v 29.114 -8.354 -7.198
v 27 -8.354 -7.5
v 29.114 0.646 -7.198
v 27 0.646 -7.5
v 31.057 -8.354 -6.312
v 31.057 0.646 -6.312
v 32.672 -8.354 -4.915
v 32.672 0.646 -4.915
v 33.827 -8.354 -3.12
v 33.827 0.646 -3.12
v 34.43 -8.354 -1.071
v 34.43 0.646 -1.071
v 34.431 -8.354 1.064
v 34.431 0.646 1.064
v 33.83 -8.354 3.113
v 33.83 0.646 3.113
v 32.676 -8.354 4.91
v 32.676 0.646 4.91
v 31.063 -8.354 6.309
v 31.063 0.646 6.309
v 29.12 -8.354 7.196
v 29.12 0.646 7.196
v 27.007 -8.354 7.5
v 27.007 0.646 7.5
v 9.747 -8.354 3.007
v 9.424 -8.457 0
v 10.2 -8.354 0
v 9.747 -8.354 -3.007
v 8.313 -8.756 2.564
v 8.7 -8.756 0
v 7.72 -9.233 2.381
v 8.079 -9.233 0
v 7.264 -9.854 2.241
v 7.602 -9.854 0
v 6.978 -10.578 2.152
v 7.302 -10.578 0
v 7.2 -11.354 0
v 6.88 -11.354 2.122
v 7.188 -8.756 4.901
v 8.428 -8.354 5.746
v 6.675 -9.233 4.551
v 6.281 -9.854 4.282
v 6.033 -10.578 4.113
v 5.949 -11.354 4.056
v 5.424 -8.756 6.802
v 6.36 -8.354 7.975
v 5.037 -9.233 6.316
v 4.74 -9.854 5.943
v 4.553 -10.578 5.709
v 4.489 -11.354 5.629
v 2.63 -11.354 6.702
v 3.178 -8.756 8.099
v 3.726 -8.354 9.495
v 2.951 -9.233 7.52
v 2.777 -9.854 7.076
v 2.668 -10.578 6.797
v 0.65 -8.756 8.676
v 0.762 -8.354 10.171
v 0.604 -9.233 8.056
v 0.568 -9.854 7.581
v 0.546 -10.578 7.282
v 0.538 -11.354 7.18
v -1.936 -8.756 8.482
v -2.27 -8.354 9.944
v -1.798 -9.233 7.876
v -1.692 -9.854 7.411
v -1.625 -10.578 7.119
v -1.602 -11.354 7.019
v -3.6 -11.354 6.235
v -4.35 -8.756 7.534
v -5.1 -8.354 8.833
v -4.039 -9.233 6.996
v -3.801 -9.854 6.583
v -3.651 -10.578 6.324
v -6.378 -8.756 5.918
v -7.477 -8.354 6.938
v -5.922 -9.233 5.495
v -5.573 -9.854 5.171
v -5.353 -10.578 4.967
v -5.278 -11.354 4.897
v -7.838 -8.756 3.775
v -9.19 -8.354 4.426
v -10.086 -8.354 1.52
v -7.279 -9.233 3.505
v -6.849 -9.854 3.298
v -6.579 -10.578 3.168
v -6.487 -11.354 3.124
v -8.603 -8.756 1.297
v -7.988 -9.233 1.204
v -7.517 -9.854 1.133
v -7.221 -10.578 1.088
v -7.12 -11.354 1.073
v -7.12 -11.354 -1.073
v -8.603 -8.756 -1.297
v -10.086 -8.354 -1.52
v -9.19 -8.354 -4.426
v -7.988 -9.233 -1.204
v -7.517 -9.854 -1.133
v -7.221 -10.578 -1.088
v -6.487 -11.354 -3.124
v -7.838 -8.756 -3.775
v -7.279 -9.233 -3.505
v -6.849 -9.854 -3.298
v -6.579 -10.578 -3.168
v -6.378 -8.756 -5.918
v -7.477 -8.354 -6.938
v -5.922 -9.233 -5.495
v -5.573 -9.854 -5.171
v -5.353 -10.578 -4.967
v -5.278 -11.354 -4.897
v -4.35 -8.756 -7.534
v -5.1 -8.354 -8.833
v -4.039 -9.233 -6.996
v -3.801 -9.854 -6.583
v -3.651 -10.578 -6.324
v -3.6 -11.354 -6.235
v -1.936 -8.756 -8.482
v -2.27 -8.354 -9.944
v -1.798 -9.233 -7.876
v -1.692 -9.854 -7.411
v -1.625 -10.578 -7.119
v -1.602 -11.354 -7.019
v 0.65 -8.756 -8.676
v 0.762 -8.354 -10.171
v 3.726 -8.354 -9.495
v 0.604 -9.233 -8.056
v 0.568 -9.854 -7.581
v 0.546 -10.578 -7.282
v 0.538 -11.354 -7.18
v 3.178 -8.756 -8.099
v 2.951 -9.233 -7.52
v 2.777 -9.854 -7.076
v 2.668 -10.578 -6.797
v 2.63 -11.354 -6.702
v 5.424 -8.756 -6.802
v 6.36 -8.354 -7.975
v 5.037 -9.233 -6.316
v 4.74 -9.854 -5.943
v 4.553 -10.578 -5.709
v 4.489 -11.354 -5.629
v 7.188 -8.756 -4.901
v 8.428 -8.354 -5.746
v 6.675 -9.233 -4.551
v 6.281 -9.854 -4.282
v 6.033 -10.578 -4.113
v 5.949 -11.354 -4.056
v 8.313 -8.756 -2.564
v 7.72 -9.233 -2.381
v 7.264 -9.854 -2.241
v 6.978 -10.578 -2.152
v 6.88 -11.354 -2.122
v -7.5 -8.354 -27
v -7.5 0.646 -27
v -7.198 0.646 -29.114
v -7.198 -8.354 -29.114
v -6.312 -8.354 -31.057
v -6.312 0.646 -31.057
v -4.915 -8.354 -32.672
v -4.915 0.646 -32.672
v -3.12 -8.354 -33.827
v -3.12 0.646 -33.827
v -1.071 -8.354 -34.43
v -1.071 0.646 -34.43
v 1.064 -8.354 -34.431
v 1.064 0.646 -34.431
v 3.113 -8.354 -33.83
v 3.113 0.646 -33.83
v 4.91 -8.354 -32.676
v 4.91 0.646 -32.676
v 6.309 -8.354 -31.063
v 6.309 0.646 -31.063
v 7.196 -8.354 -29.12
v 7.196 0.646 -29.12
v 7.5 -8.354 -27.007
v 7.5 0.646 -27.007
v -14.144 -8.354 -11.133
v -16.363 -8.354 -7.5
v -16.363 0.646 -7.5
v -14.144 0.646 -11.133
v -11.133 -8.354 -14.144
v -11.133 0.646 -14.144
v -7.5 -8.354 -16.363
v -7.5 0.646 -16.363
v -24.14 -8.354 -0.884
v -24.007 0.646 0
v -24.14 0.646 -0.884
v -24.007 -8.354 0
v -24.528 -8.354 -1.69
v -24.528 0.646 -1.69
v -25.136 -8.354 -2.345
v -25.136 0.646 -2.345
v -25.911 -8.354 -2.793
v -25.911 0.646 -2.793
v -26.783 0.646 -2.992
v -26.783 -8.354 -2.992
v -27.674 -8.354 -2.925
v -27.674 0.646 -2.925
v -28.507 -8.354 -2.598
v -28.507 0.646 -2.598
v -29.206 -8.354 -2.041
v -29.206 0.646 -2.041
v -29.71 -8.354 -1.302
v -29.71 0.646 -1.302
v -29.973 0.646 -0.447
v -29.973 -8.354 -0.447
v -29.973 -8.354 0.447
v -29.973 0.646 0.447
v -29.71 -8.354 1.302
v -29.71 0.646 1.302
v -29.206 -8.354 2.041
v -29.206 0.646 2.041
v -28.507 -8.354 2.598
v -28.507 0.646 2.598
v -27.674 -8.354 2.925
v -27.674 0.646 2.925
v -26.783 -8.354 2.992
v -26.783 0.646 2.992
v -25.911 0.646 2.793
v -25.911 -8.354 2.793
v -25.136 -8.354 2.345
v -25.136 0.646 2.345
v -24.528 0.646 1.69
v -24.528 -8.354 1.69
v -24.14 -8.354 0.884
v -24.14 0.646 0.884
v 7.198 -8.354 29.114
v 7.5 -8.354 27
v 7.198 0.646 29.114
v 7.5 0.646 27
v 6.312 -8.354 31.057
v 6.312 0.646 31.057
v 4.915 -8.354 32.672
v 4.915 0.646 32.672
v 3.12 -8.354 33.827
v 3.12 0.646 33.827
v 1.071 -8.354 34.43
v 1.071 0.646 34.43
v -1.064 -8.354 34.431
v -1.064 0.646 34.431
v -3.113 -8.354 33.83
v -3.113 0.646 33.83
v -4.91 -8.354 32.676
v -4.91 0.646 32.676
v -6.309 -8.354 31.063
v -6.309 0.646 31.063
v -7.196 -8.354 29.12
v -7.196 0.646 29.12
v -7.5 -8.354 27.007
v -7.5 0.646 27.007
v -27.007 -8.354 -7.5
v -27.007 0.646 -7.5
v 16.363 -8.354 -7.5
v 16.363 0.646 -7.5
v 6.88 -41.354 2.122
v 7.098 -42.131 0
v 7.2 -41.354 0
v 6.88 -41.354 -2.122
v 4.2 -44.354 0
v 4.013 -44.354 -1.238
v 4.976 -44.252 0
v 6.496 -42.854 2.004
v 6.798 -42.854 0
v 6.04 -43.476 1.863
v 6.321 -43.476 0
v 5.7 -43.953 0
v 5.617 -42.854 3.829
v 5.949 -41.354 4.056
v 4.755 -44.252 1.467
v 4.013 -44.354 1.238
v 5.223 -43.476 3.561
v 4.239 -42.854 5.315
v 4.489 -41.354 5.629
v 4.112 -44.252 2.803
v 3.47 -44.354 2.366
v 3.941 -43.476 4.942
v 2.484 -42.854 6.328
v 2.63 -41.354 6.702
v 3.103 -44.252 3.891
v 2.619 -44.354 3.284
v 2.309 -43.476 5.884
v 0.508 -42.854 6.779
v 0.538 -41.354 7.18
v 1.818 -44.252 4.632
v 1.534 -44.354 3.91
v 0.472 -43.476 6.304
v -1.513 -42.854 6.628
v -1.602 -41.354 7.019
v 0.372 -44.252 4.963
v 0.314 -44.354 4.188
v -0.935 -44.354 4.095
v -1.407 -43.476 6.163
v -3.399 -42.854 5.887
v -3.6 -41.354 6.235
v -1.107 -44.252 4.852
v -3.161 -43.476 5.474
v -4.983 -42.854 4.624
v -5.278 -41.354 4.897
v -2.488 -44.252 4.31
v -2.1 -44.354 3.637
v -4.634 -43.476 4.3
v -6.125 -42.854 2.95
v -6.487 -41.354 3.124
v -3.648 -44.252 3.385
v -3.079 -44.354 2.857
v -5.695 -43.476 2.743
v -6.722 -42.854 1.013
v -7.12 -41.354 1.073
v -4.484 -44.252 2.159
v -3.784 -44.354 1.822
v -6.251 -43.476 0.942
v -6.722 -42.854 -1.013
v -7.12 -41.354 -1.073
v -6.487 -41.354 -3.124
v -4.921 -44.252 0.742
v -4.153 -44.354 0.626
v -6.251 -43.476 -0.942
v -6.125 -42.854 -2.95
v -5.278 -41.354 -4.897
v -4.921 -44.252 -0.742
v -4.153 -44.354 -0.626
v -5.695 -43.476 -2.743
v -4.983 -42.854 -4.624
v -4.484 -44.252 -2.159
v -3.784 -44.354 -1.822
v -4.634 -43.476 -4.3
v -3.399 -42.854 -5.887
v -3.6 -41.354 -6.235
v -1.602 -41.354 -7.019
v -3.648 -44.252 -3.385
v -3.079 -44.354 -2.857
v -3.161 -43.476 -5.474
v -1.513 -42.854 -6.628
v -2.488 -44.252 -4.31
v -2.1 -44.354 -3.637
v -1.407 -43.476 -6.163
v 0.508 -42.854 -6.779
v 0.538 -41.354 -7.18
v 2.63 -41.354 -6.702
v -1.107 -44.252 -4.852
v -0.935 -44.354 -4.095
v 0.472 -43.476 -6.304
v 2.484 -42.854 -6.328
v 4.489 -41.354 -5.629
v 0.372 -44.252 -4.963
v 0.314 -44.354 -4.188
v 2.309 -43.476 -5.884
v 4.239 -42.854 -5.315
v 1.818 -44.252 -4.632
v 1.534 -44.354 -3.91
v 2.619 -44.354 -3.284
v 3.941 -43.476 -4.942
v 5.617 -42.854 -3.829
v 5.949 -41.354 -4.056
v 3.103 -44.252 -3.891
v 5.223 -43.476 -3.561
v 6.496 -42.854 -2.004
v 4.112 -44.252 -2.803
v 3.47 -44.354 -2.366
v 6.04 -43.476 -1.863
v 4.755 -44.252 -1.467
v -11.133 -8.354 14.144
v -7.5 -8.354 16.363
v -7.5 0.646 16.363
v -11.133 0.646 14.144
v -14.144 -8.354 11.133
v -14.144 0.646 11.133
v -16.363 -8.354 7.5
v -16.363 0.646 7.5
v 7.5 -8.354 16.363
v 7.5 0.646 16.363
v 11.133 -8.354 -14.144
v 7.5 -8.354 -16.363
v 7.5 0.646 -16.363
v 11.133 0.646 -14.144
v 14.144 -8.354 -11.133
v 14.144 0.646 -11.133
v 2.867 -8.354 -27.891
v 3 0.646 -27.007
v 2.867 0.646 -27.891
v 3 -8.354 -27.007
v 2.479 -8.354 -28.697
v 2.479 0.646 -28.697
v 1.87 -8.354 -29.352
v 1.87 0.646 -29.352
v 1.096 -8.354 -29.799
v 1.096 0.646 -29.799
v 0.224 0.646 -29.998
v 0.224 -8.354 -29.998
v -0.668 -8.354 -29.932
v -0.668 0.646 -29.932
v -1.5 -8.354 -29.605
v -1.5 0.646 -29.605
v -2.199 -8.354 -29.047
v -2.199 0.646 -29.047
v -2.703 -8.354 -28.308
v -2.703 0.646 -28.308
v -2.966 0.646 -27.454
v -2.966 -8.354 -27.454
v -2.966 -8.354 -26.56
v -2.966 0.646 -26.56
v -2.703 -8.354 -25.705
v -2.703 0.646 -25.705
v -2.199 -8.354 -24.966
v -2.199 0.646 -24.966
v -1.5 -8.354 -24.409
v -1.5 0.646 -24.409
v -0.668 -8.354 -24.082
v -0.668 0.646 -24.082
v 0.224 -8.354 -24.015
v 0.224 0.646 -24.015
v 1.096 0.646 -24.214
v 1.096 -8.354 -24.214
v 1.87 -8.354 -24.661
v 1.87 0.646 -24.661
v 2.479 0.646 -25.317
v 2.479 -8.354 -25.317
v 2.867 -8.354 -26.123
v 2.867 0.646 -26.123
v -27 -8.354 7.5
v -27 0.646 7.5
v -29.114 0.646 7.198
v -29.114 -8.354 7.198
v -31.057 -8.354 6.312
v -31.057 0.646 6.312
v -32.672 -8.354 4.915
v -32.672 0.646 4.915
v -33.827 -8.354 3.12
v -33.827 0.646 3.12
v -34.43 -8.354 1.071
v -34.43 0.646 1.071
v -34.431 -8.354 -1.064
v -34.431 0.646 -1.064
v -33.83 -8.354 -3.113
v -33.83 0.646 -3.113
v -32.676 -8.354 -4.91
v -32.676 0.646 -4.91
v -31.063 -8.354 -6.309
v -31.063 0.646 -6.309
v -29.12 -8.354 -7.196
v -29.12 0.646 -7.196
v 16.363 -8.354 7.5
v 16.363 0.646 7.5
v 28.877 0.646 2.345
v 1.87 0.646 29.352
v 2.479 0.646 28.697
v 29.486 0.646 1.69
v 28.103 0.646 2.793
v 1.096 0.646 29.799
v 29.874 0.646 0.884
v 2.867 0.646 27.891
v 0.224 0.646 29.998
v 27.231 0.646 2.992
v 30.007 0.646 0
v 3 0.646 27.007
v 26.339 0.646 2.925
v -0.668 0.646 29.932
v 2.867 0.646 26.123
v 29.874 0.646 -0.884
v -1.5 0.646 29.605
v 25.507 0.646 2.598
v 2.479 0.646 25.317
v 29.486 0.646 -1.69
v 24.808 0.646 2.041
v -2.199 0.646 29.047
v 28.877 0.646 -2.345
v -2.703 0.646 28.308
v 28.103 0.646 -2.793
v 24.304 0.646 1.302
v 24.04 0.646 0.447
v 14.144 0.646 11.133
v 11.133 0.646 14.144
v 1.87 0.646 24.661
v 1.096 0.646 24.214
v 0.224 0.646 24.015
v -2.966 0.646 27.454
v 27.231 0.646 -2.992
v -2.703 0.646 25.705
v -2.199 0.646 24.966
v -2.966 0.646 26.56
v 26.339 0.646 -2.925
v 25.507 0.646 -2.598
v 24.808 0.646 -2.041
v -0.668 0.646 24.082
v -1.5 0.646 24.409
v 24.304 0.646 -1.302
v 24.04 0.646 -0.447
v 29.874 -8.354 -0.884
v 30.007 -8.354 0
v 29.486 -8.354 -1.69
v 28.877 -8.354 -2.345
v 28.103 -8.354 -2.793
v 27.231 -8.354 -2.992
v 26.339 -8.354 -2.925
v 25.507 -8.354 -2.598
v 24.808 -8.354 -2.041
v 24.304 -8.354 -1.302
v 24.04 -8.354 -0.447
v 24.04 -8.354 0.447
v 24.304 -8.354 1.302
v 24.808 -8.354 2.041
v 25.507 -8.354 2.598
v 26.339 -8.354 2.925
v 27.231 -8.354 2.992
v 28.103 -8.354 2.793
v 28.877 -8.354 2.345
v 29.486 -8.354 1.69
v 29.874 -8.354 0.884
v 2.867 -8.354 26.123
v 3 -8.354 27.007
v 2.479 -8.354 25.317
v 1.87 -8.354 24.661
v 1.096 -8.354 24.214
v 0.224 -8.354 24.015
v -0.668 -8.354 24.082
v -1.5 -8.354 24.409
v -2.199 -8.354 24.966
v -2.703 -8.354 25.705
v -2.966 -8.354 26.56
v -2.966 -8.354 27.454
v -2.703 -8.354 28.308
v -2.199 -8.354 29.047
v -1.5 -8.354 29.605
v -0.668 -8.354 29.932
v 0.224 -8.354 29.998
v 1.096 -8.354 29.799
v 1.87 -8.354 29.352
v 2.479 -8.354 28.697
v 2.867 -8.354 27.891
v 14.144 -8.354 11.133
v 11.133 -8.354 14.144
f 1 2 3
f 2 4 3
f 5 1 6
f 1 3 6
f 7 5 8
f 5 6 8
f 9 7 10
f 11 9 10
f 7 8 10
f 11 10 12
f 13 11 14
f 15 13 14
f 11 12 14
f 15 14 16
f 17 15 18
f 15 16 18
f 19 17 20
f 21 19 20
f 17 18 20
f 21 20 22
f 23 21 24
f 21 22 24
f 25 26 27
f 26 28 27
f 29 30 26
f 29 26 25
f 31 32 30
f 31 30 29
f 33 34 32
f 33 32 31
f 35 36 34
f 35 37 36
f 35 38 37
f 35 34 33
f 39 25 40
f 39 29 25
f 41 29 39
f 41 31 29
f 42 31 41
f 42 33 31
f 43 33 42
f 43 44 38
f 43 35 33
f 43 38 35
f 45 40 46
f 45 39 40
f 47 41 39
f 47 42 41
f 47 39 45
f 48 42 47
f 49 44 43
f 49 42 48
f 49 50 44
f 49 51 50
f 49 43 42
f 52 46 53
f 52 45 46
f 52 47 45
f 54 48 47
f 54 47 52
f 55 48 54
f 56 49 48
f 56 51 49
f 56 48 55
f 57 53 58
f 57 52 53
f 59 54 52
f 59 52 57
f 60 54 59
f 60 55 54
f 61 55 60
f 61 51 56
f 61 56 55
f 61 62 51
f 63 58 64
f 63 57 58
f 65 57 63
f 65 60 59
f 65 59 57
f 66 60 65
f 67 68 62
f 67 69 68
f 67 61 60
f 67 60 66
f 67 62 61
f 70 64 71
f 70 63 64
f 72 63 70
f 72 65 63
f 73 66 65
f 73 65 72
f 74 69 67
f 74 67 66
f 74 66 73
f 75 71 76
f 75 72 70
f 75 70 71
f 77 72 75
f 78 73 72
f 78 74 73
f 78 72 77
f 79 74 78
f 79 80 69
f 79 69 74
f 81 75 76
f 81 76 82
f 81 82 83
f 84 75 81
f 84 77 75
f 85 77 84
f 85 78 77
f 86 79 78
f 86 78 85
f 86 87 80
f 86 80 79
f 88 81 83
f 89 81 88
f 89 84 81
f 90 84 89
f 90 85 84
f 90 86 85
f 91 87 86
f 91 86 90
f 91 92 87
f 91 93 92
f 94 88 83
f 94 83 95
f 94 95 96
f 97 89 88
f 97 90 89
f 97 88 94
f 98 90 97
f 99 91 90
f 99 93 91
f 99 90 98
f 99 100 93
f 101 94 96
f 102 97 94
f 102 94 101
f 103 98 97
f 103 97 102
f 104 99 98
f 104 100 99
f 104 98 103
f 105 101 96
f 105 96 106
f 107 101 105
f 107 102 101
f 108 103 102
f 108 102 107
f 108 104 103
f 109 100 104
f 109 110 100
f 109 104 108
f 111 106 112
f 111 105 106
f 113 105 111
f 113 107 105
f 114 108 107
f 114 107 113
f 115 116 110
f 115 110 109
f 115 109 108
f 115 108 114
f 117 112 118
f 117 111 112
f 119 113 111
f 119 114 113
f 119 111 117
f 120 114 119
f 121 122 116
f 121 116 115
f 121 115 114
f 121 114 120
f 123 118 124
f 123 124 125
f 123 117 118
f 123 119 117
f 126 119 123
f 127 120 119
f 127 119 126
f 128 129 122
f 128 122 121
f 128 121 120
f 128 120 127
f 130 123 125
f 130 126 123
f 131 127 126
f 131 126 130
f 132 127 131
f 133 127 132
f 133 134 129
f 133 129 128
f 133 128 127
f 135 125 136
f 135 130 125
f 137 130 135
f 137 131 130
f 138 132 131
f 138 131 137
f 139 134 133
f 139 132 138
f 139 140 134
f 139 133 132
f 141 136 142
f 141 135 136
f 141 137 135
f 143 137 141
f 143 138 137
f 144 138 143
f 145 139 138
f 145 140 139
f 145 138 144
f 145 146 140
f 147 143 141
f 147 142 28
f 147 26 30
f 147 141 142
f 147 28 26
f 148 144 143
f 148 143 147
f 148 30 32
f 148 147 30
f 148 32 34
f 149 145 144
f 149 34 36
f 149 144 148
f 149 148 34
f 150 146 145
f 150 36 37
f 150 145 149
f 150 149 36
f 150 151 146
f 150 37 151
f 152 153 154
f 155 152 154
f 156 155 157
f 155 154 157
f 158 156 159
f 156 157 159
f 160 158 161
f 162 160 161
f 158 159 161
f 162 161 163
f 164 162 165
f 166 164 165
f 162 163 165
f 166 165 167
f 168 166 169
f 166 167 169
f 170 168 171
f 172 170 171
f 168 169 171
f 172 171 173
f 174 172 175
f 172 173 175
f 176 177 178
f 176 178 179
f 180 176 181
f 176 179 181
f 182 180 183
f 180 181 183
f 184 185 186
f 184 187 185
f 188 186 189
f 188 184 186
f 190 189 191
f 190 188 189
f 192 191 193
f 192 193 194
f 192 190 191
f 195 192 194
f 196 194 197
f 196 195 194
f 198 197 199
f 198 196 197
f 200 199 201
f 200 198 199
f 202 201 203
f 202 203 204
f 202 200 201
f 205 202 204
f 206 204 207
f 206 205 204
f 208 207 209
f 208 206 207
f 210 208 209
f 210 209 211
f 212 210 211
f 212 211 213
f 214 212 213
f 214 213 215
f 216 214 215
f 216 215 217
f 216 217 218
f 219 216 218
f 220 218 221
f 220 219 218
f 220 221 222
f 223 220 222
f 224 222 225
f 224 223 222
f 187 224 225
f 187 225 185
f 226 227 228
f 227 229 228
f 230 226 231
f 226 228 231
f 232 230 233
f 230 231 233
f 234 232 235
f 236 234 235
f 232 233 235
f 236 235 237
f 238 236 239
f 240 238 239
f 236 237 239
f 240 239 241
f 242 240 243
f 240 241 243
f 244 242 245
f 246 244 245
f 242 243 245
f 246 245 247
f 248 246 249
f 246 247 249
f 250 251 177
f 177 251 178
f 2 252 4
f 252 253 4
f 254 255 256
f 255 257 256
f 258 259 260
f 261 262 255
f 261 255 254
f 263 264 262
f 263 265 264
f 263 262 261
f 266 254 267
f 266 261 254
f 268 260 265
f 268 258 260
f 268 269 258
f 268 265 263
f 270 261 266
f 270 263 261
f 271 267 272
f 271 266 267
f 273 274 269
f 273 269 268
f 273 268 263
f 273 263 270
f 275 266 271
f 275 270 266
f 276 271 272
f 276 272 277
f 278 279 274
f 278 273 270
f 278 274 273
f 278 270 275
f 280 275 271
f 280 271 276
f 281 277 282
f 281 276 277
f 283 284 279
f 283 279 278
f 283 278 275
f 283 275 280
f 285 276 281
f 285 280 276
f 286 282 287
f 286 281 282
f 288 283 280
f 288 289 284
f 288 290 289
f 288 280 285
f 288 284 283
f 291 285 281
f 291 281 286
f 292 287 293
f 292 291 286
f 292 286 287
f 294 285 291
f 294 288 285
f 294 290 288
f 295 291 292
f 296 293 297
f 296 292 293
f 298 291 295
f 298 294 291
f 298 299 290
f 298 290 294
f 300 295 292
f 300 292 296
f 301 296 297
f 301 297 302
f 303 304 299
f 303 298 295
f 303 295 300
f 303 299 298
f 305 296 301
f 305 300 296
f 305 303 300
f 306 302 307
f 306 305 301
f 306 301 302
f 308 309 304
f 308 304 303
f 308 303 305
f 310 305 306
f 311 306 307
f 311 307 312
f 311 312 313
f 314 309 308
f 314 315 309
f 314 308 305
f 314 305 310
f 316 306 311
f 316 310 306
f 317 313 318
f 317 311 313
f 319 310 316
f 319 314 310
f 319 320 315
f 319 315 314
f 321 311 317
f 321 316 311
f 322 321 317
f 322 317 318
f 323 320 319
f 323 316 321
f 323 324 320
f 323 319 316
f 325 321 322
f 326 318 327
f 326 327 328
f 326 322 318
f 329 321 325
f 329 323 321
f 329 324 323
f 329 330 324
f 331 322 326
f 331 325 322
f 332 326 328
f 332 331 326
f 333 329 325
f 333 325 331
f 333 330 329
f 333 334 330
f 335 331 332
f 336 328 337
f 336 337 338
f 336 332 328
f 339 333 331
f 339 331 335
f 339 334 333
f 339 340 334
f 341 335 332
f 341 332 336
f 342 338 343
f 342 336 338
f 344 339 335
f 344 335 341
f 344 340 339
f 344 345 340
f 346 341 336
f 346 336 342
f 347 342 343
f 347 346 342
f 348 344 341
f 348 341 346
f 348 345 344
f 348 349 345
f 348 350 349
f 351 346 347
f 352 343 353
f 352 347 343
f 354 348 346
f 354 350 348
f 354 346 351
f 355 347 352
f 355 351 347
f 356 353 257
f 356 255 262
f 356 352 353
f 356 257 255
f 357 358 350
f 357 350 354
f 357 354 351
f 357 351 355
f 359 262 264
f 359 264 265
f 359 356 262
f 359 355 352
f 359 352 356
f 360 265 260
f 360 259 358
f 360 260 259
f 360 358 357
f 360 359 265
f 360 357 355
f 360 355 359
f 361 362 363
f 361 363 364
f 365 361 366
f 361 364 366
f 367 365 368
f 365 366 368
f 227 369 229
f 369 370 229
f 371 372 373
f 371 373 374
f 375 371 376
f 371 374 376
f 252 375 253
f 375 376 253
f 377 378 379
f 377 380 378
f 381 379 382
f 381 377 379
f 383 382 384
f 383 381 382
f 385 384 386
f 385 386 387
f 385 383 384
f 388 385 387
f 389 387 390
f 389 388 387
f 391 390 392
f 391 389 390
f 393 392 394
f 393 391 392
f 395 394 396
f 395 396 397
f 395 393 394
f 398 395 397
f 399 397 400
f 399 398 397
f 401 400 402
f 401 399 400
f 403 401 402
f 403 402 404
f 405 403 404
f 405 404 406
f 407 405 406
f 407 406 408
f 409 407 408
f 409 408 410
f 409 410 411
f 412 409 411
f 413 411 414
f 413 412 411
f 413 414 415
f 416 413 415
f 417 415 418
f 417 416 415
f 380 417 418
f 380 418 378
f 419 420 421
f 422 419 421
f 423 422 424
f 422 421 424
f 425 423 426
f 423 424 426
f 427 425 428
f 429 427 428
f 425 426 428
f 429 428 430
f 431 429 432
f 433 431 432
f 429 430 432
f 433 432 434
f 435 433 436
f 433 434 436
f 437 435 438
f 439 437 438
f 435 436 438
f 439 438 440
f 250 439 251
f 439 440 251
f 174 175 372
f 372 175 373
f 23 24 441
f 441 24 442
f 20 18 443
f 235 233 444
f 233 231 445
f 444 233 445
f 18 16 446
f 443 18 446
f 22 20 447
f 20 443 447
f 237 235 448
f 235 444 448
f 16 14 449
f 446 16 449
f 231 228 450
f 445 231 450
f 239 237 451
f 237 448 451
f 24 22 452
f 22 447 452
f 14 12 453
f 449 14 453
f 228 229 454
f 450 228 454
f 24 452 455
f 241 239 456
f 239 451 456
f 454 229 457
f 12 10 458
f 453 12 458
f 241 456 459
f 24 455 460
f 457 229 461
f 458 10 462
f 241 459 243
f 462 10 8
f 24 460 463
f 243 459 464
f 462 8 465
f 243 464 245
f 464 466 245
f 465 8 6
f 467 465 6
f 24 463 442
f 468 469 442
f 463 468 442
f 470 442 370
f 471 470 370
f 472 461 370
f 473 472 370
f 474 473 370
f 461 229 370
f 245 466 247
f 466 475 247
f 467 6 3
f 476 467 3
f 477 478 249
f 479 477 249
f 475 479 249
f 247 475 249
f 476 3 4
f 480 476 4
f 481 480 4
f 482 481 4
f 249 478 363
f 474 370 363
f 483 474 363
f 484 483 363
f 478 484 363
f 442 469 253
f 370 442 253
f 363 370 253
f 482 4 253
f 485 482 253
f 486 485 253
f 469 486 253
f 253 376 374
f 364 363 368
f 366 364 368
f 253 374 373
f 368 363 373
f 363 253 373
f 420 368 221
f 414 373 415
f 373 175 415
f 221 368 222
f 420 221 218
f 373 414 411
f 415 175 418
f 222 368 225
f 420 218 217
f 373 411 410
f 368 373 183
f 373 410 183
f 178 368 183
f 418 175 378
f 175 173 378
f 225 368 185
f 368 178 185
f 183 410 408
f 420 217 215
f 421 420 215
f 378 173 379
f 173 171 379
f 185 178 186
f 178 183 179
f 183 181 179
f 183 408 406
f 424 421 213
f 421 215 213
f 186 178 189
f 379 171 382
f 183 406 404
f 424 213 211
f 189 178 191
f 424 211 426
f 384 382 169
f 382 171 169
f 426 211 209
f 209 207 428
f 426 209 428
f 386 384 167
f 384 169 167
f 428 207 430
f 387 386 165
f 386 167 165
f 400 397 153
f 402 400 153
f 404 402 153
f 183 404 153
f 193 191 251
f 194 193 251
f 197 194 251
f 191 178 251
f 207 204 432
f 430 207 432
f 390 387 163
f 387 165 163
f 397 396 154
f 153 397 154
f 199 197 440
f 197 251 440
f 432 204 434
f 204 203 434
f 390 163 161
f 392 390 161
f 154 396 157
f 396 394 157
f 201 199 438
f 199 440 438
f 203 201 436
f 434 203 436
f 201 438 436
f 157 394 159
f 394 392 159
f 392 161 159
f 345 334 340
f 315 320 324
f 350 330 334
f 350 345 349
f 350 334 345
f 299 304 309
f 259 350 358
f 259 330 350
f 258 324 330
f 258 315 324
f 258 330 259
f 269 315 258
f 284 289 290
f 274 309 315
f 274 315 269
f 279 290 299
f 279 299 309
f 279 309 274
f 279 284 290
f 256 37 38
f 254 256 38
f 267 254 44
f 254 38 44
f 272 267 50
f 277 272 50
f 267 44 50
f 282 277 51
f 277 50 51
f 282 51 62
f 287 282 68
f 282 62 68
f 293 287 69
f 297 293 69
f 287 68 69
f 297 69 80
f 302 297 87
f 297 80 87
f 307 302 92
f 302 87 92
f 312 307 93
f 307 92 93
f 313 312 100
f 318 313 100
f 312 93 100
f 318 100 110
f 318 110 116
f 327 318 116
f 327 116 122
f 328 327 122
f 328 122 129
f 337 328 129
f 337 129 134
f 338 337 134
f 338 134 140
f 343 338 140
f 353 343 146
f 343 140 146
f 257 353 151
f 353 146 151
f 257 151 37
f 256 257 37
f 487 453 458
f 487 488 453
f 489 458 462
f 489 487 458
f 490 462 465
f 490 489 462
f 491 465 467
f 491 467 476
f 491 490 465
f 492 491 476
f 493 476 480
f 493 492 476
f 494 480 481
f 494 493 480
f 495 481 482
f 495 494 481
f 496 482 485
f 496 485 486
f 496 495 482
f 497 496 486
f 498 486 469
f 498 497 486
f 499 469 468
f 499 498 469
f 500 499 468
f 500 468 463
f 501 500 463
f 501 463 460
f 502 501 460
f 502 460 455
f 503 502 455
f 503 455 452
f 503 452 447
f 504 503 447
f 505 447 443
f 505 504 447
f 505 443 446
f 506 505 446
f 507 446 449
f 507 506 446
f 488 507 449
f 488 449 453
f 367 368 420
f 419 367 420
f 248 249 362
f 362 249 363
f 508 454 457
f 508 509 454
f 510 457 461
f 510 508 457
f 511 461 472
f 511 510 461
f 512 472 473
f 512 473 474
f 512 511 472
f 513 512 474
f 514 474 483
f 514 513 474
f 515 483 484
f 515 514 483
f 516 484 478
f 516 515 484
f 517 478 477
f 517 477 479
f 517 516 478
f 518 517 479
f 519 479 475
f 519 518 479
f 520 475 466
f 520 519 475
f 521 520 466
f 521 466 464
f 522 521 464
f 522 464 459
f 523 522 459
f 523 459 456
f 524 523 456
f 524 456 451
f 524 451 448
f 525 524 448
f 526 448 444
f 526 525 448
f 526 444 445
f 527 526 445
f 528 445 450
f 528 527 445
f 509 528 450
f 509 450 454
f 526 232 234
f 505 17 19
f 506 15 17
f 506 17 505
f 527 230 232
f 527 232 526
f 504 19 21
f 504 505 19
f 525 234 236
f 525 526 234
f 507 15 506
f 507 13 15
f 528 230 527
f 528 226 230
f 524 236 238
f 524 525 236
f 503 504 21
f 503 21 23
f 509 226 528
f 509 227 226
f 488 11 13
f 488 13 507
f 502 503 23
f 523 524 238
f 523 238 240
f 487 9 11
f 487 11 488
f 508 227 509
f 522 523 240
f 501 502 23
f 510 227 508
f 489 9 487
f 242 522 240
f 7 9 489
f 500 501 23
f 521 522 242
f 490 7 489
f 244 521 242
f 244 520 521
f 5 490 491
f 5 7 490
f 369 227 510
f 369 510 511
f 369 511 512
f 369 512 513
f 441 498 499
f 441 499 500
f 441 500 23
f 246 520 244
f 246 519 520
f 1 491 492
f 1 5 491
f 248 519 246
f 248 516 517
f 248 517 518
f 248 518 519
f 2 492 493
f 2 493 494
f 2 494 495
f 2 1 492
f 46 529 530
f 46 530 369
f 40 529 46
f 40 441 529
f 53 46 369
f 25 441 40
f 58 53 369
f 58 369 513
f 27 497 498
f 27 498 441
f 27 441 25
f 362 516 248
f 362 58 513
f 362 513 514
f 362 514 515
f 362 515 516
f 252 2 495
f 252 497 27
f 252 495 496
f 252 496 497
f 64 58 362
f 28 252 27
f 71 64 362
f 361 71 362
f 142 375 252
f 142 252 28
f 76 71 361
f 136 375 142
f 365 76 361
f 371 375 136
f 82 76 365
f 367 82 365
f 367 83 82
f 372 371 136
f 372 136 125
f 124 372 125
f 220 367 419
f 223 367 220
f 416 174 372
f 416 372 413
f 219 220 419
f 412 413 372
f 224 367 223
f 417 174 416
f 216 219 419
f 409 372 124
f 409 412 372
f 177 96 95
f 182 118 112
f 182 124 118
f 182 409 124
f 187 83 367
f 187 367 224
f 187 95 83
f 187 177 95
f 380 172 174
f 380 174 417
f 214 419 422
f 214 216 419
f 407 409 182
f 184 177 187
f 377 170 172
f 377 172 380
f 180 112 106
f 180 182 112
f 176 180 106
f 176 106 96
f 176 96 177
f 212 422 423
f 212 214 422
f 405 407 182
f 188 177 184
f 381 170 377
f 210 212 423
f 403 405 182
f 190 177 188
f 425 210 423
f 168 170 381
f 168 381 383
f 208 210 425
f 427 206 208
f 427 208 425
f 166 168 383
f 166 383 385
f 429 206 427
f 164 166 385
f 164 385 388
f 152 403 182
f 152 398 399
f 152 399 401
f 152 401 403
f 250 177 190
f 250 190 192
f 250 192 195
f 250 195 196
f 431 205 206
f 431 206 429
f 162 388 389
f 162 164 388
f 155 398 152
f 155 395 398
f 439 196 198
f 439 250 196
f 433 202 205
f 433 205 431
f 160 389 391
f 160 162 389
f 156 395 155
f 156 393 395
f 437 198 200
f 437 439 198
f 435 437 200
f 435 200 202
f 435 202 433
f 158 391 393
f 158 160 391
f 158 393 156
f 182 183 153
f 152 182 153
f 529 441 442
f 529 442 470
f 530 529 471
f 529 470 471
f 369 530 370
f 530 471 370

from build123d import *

# Parameters (mm, degrees)
SKETCH1_R           = 5
BOSS_EXTRUDE1_DEPTH = 7.5
SKETCH2_R           = 12
BOSS_EXTRUDE2_DEPTH = 60
FILLET1_R           = 5
SCALE1_SCALE        = 0.6


with BuildPart() as part:
    # Sketch1 → Boss-Extrude1 (new body, symmetric)
    with BuildSketch(Plane(origin=(0, 0, 0), x_dir=(1, 0, 0), z_dir=(0, 1, 0))):
        with BuildLine():
            Line((12.5, 45.011324124), (12.5, 27.271780287))
            ThreePointArc((12.5, 27.271780287), (21.213203436, 21.213203436), (27.271780287, 12.5))
            Line((27.271780287, 12.5), (45, 12.5))
            ThreePointArc((45, 12.5), (57.511322842, 0.00566206), (45.011324124, -12.5))
            Line((45.011324124, -12.5), (27.271780287, -12.5))
            ThreePointArc((27.271780287, -12.5), (21.213203436, -21.213203436), (12.5, -27.271780287))
            Line((12.5, -27.271780287), (12.5, -45))
            ThreePointArc((12.5, -45), (0.00566206, -57.511322842), (-12.5, -45.011324124))
            Line((-12.5, -45.011324124), (-12.5, -27.271780287))
            ThreePointArc((-12.5, -27.271780287), (-21.213203436, -21.213203436), (-27.271780287, -12.5))
            Line((-27.271780287, -12.5), (-45, -12.5))
            ThreePointArc((-45, -12.5), (-57.511322842, -0.00566206), (-45.011324124, 12.5))
            Line((-45.011324124, 12.5), (-27.271780287, 12.5))
            ThreePointArc((-27.271780287, 12.5), (-21.213203436, 21.213203436), (-12.5, 27.271780287))
            Line((-12.5, 27.271780287), (-12.5, 45))
            ThreePointArc((-12.5, 45), (-0.00566206, 57.511322842), (12.5, 45.011324124))
        make_face()
        with Locations((0, 45.011324124)):
            Circle(SKETCH1_R, mode=Mode.SUBTRACT)
        with Locations((45.011324124, 0)):
            Circle(SKETCH1_R, mode=Mode.SUBTRACT)
        with Locations((0, -45.011324124)):
            Circle(SKETCH1_R, mode=Mode.SUBTRACT)
        with Locations((-45.011324124, 0)):
            Circle(SKETCH1_R, mode=Mode.SUBTRACT)
    extrude(amount=BOSS_EXTRUDE1_DEPTH, both=True)

    # Sketch2 → Boss-Extrude2 (add)
    with BuildSketch(Plane.XZ.offset(7.5)):
        Circle(SKETCH2_R)
    extrude(amount=BOSS_EXTRUDE2_DEPTH)

    # Fillet1
    fillet1_edges = [part.edges().sort_by_distance(p)[0] for p in [
        (-12, -7.5, 0),
        (-12, -67.5, 0),
    ]]
    fillet(fillet1_edges, radius=FILLET1_R)


with BuildPart() as part_1:
    # Scale1: scaled about (0, -9.636129327, 0)
    add(part.part.scale(SCALE1_SCALE).moved(Location((0, -3.854451731, 0))))


solid = part_1.part
